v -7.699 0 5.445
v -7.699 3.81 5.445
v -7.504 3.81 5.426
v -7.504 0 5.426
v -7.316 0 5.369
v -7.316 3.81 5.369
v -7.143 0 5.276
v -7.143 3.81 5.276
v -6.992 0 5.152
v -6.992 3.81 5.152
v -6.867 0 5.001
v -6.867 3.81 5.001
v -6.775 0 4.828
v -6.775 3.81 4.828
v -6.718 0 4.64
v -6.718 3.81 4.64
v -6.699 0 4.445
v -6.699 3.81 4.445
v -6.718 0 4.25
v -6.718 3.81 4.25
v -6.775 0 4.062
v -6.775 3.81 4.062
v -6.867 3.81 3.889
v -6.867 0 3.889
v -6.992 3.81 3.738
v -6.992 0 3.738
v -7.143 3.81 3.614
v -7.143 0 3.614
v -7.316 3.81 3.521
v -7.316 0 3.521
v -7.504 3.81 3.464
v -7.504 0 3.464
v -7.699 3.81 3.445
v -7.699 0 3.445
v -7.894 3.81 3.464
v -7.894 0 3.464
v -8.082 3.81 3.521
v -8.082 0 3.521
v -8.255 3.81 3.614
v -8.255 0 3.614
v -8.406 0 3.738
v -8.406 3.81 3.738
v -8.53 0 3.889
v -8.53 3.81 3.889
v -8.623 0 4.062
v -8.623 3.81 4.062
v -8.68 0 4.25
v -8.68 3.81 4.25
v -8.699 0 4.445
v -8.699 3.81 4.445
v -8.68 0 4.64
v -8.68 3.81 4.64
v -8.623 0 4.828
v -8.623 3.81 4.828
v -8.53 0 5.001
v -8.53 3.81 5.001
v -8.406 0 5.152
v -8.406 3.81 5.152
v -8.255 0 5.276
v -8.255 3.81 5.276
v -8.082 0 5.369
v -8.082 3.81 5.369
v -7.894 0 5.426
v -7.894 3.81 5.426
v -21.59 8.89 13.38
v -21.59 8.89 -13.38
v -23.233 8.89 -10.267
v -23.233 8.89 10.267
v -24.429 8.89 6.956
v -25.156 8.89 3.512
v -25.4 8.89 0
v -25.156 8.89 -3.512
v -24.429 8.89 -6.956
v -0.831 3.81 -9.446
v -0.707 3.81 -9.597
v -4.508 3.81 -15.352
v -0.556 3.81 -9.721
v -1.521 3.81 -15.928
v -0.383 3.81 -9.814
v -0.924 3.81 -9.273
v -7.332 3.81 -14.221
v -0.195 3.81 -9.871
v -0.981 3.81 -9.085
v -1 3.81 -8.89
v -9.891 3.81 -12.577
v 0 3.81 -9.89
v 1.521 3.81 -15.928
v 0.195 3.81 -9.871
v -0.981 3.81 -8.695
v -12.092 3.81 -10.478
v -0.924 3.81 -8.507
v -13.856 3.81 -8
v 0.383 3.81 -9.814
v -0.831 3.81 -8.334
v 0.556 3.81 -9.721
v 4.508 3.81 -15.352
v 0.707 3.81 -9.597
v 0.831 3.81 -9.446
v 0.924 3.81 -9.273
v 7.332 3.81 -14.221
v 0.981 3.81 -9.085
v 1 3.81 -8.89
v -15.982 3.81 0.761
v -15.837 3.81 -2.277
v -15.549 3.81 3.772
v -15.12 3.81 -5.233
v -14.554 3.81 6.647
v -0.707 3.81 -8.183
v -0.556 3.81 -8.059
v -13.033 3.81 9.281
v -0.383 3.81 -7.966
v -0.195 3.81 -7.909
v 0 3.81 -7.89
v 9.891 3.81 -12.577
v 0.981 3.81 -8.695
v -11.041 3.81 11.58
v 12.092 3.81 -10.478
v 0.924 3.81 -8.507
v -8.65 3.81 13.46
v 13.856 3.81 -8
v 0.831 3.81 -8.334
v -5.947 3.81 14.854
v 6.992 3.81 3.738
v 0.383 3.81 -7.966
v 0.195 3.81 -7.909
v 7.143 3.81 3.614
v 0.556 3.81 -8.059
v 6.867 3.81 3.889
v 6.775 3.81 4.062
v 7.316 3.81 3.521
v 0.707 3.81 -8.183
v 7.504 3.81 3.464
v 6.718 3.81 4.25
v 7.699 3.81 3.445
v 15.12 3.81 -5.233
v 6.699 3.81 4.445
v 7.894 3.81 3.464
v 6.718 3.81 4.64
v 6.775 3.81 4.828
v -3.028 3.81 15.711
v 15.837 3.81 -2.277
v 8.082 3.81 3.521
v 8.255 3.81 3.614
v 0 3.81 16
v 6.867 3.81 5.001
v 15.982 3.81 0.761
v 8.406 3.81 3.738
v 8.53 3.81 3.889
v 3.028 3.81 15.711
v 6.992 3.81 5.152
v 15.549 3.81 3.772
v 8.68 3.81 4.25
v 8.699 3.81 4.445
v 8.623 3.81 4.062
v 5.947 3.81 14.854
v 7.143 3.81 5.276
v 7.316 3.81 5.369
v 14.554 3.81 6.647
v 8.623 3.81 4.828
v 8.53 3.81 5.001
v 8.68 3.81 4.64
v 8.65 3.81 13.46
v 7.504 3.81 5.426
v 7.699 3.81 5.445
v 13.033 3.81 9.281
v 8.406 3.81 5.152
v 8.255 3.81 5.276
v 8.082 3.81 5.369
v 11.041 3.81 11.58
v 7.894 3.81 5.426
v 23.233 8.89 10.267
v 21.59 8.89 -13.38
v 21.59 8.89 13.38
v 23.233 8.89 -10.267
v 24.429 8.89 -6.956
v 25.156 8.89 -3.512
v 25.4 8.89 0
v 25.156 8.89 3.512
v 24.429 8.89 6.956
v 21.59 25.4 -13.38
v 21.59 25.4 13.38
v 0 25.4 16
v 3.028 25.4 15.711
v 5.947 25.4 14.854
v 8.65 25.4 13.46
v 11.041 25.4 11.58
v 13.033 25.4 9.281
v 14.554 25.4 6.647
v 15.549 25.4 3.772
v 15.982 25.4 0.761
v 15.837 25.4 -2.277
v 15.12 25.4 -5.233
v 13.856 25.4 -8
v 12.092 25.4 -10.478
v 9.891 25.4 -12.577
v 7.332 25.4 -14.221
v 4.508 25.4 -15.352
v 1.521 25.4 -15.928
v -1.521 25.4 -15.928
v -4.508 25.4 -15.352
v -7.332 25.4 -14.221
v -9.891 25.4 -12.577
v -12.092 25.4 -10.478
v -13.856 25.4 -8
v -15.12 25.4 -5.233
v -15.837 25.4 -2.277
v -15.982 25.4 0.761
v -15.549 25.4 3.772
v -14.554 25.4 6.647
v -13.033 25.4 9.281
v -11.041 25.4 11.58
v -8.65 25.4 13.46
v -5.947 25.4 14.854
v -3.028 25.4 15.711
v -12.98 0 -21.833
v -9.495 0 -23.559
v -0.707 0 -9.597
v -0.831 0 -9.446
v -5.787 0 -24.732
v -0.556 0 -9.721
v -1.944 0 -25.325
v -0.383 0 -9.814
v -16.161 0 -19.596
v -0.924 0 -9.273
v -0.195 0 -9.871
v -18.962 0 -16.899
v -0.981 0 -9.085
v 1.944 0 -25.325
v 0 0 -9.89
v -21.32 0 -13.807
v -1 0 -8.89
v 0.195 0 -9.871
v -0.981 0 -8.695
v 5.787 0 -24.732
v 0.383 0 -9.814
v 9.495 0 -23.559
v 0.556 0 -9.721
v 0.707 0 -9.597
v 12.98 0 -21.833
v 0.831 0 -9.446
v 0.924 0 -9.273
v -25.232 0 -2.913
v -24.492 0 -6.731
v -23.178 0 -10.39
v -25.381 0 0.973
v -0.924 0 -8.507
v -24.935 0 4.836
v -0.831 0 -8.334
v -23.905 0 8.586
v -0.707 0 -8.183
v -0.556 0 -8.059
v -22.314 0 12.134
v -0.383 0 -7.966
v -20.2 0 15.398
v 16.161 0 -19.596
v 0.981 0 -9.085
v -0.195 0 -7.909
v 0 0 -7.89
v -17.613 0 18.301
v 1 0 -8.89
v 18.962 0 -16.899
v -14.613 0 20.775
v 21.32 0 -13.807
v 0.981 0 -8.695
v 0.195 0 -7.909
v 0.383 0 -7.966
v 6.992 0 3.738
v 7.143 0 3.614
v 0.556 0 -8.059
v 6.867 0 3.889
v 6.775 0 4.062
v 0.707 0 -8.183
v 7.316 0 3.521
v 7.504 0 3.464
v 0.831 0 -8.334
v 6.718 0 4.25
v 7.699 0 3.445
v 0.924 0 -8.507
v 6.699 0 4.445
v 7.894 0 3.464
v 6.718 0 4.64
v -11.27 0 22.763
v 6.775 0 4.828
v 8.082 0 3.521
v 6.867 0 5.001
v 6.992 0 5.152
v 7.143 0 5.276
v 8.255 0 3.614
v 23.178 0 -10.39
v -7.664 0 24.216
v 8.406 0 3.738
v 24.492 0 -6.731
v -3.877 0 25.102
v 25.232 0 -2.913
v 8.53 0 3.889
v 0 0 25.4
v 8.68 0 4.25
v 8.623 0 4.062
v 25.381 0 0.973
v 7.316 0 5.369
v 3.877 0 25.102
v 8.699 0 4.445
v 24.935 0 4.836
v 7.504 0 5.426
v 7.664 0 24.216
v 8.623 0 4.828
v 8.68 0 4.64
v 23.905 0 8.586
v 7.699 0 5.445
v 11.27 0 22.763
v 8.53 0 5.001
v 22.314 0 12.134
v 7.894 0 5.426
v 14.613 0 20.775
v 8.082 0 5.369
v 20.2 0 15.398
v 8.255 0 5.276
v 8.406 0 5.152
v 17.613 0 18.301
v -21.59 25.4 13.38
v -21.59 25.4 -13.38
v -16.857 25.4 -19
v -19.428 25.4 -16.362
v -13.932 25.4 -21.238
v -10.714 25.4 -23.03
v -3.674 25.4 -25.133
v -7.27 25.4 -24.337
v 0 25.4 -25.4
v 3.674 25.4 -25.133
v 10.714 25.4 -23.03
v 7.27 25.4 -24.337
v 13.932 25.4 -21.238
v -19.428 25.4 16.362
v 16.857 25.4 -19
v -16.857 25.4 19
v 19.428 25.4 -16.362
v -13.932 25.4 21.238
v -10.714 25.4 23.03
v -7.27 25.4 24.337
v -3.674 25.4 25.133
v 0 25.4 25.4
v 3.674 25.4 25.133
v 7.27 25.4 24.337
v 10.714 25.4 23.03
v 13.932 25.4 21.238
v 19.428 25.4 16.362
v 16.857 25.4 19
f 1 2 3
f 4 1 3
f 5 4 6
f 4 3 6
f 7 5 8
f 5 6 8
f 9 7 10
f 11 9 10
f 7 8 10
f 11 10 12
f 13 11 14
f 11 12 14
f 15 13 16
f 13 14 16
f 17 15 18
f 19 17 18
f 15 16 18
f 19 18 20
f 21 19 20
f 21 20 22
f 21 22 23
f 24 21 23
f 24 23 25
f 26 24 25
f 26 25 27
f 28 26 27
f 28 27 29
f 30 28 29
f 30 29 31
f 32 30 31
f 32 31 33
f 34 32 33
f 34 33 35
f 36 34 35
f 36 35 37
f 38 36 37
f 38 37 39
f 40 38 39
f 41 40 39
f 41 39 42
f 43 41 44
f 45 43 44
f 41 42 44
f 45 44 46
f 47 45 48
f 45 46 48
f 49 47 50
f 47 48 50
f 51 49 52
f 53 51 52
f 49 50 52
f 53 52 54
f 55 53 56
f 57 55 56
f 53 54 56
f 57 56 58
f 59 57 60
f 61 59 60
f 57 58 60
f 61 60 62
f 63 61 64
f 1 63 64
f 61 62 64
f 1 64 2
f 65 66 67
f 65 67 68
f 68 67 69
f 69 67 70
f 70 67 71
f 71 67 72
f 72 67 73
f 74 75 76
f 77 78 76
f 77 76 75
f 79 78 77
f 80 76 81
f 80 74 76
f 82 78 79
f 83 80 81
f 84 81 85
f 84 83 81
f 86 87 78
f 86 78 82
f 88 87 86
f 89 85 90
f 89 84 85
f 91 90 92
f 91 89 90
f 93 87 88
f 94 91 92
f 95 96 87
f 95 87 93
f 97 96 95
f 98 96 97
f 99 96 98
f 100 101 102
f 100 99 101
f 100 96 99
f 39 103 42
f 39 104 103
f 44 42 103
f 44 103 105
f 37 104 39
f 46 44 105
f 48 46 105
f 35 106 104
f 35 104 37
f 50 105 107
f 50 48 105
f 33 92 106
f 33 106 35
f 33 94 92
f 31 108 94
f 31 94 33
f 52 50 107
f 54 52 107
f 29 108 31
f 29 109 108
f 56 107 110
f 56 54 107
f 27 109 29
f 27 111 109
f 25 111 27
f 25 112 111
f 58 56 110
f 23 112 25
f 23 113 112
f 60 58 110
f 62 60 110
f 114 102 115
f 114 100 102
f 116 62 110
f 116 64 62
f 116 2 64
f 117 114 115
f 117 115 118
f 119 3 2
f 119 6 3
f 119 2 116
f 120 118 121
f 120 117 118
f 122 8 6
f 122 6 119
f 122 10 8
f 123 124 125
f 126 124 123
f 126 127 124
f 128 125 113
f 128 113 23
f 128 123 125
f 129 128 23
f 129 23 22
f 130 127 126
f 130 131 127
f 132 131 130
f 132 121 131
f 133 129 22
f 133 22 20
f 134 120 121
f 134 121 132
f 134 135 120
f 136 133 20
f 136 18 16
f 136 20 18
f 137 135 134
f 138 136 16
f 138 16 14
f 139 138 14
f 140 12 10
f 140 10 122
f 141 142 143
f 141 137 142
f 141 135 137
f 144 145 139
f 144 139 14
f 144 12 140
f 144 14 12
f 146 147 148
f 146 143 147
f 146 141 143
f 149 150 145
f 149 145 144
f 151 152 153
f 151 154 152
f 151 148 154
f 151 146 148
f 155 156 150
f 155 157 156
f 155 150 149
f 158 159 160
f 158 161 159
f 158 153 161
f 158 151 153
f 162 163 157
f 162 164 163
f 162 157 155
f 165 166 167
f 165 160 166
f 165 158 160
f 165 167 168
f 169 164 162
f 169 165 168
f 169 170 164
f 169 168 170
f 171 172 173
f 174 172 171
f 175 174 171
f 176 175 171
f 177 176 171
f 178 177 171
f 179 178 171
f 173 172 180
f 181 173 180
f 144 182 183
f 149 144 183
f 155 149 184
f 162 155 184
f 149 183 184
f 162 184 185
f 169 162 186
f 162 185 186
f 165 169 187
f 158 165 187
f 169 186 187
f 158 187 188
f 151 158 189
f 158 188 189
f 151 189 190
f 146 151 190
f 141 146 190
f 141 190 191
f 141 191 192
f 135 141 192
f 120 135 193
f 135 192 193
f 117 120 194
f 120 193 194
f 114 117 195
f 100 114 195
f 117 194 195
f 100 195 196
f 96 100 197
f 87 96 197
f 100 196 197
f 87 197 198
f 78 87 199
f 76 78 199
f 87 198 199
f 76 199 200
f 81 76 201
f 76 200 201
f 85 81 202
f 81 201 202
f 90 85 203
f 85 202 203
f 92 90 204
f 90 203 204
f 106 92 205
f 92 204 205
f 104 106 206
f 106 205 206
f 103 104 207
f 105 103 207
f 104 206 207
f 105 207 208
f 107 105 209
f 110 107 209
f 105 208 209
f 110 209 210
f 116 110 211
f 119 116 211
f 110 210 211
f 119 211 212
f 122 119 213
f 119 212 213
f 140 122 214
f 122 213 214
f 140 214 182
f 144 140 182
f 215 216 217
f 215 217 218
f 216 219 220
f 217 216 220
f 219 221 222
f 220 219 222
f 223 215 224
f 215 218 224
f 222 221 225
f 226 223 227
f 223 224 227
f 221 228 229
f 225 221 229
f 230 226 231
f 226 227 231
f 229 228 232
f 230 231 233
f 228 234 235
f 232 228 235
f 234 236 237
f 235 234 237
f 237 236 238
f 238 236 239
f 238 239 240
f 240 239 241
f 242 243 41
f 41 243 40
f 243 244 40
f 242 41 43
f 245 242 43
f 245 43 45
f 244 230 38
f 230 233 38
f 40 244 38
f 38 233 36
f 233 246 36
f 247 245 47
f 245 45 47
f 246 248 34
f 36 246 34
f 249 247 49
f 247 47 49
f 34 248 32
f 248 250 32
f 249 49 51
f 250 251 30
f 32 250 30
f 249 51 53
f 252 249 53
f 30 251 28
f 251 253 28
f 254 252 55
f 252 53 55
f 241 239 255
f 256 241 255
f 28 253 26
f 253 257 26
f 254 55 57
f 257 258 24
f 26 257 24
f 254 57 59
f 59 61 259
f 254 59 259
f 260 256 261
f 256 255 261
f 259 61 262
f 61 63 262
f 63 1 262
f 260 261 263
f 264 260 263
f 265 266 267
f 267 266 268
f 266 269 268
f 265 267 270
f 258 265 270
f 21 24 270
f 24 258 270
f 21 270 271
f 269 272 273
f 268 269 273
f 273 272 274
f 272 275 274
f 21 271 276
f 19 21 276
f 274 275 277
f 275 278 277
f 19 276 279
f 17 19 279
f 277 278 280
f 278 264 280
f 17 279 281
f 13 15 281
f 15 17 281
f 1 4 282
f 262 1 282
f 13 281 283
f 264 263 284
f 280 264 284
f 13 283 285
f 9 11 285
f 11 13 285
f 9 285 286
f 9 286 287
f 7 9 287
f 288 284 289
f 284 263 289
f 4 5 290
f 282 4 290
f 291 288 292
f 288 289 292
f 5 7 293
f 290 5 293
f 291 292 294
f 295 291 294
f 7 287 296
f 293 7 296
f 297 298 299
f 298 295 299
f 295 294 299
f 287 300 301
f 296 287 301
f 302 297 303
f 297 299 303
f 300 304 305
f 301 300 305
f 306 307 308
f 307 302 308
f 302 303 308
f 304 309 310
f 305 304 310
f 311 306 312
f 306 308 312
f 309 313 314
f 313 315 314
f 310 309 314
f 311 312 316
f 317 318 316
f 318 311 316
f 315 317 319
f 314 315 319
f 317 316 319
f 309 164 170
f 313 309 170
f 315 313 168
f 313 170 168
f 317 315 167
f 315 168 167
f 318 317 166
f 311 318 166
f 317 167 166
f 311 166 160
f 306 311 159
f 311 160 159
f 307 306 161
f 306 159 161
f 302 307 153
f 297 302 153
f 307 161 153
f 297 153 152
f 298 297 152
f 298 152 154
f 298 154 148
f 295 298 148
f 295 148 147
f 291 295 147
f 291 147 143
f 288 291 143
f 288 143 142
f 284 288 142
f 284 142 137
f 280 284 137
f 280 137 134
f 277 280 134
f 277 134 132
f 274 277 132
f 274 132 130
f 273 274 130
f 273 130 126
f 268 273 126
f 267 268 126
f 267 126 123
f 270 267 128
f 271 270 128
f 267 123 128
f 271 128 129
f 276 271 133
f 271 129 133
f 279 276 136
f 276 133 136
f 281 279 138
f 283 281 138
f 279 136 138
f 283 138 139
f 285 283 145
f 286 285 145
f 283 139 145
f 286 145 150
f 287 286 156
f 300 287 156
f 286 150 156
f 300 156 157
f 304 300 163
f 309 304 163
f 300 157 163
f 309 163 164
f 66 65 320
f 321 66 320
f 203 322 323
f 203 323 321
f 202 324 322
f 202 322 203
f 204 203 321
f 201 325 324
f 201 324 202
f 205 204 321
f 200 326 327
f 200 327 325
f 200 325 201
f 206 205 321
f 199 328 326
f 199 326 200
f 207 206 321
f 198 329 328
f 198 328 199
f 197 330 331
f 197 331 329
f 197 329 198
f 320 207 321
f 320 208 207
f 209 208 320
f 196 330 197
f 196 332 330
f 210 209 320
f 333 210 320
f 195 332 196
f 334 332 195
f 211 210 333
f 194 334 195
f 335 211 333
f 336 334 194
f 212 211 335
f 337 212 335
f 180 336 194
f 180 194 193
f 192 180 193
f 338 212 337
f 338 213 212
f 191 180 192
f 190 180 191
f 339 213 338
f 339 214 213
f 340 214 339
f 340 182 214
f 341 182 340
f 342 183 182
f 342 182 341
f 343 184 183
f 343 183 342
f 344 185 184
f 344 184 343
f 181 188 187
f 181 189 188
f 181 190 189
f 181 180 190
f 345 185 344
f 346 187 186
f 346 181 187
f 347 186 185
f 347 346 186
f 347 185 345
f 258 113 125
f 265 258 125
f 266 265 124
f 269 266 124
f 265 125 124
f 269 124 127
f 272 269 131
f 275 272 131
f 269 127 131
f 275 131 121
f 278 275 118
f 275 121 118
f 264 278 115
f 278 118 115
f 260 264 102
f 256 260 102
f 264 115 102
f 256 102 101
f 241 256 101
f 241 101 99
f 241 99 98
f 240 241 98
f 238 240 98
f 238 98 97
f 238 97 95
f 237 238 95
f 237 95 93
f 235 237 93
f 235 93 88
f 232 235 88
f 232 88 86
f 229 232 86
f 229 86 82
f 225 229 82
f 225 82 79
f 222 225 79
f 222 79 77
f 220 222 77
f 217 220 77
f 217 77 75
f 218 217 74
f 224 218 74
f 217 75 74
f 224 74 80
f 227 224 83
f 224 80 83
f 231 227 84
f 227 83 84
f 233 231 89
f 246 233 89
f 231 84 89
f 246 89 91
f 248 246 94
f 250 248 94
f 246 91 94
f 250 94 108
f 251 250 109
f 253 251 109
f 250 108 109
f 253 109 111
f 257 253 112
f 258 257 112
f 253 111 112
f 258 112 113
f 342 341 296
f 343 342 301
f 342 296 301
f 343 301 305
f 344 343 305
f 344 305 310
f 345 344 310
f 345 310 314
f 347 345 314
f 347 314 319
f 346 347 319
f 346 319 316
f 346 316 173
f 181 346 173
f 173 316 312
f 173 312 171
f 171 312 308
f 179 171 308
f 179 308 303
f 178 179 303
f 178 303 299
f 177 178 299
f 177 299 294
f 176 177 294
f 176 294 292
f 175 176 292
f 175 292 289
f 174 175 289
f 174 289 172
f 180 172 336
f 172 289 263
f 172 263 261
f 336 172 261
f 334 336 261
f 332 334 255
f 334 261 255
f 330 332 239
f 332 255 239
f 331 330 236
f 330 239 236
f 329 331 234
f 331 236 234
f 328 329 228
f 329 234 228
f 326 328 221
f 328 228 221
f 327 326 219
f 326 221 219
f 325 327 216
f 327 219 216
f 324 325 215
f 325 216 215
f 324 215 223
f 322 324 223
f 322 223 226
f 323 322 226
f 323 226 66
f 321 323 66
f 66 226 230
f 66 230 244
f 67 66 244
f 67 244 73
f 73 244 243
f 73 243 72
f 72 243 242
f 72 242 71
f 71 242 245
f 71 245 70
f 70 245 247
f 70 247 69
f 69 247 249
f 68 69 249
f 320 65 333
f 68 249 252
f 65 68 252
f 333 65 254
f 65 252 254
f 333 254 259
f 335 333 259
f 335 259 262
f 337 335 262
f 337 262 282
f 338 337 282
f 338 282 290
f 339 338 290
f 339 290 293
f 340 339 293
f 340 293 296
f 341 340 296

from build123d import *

# Parameters (mm, degrees)
SKETCH1_R                           = 25.4
BOSS_EXTRUDE1_DEPTH                 = 25.4
SKETCH2_R                           = 16
CUT_EXTRUDE1_DEPTH                  = 21.59
CUT_EXTRUDE2_REACH                  = 45.994
CUT_EXTRUDE2_END_RADIUS             = 25.4
SKETCH3_W                           = 3.81
SKETCH3_H                           = 16.51
CUT_EXTRUDE2_DIRECTION_2_REACH      = 45.994
CUT_EXTRUDE2_DIRECTION_2_END_RADIUS = 25.4
CUT_EXTRUDE3_REACH                  = 43.91
SKETCH4_R                           = 1


with BuildPart() as part:
    # Sketch1 → Boss-Extrude1 (new body)
    with BuildSketch(Plane(origin=(0, 0, 0), x_dir=(1, 0, 0), z_dir=(0, 1, 0))):
        with Locations(Location((0, 0, 0), (0, 0, 270))):
            Circle(SKETCH1_R)
    extrude(amount=BOSS_EXTRUDE1_DEPTH)

    # Sketch2 → Cut-Extrude1 (cut)
    with BuildSketch(Plane(origin=(0, 25.4, 0), x_dir=(1, 0, 0), z_dir=(0, 1, 0))):
        with Locations(Location((0, 0, 0), (0, 0, 270))):
            Circle(SKETCH2_R)
    extrude(amount=-CUT_EXTRUDE1_DEPTH, mode=Mode.SUBTRACT)

    # Cut-Extrude2: up to this cylinder (the profile starts inside it)
    cut_extrude2_end = Plane(origin=(0, 17.145, 0), z_dir=(0, -1, 0)) * Cylinder(CUT_EXTRUDE2_END_RADIUS, 143.788, mode=Mode.PRIVATE)
    # Sketch3 → Cut-Extrude2 (cut, up to the surface)
    with BuildSketch(Plane.XY, mode=Mode.PRIVATE) as cut_extrude2_sk1:
        with Locations((23.495, 17.145)):
            Rectangle(SKETCH3_W, SKETCH3_H)
    cut_extrude2_tool1 = extrude(cut_extrude2_sk1.sketch, amount=-CUT_EXTRUDE2_REACH, mode=Mode.PRIVATE) & cut_extrude2_end
    add(cut_extrude2_tool1.solids().sort_by_distance((23.495, 17.145, 0))[0], mode=Mode.SUBTRACT)
    # Sketch3 → Cut-Extrude2 (cut, up to the surface)
    with BuildSketch(Plane.XY, mode=Mode.PRIVATE) as cut_extrude2_sk2:
        with Locations((-23.495, 17.145)):
            Rectangle(SKETCH3_W, SKETCH3_H)
    cut_extrude2_tool2 = extrude(cut_extrude2_sk2.sketch, amount=-CUT_EXTRUDE2_REACH, mode=Mode.PRIVATE) & cut_extrude2_end
    add(cut_extrude2_tool2.solids().sort_by_distance((-23.495, 17.145, 0))[0], mode=Mode.SUBTRACT)

    # Cut-Extrude2 direction 2: up to this cylinder (the profile starts inside it)
    cut_extrude2_direction_2_end = Plane(origin=(0, 17.145, 0), z_dir=(0, -1, 0)) * Cylinder(CUT_EXTRUDE2_DIRECTION_2_END_RADIUS, 143.788, mode=Mode.PRIVATE)
    # Sketch3 → Cut-Extrude2 direction 2 (cut, up to the surface)
    with BuildSketch(Plane.XY, mode=Mode.PRIVATE) as cut_extrude2_direction_2_sk1:
        with Locations((23.495, 17.145)):
            Rectangle(SKETCH3_W, SKETCH3_H)
    cut_extrude2_direction_2_tool1 = extrude(cut_extrude2_direction_2_sk1.sketch, amount=CUT_EXTRUDE2_DIRECTION_2_REACH, mode=Mode.PRIVATE) & cut_extrude2_direction_2_end
    add(cut_extrude2_direction_2_tool1.solids().sort_by_distance((23.495, 17.145, 0))[0], mode=Mode.SUBTRACT)
    # Sketch3 → Cut-Extrude2 direction 2 (cut, up to the surface)
    with BuildSketch(Plane.XY, mode=Mode.PRIVATE) as cut_extrude2_direction_2_sk2:
        with Locations((-23.495, 17.145)):
            Rectangle(SKETCH3_W, SKETCH3_H)
    cut_extrude2_direction_2_tool2 = extrude(cut_extrude2_direction_2_sk2.sketch, amount=CUT_EXTRUDE2_DIRECTION_2_REACH, mode=Mode.PRIVATE) & cut_extrude2_direction_2_end
    add(cut_extrude2_direction_2_tool2.solids().sort_by_distance((-23.495, 17.145, 0))[0], mode=Mode.SUBTRACT)

    # Sketch4 → Cut-Extrude3 (cut, up to next)
    with BuildSketch(Plane(origin=(0, 3.81, 0), x_dir=(1, 0, 0), z_dir=(0, 1, 0)), mode=Mode.PRIVATE) as cut_extrude3_sk1:
        with Locations(Location((0, 8.89, 0), (0, 0, 270))):
            Circle(SKETCH4_R)
    cut_extrude3_tool1 = extrude(cut_extrude3_sk1.sketch, amount=-CUT_EXTRUDE3_REACH, mode=Mode.PRIVATE) & part.part
    # Sketch4 → Cut-Extrude3 (cut, up to next)
    with BuildSketch(Plane(origin=(0, 3.81, 0), x_dir=(1, 0, 0), z_dir=(0, 1, 0)), mode=Mode.PRIVATE) as cut_extrude3_sk2:
        with Locations(Location((7.69896584, -4.445, 0), (0, 0, 270))):
            Circle(SKETCH4_R)
    cut_extrude3_tool2 = extrude(cut_extrude3_sk2.sketch, amount=-CUT_EXTRUDE3_REACH, mode=Mode.PRIVATE) & part.part
    # Sketch4 → Cut-Extrude3 (cut, up to next)
    with BuildSketch(Plane(origin=(0, 3.81, 0), x_dir=(1, 0, 0), z_dir=(0, 1, 0)), mode=Mode.PRIVATE) as cut_extrude3_sk3:
        with Locations(Location((-7.69896584, -4.445, 0), (0, 0, 270))):
            Circle(SKETCH4_R)
    cut_extrude3_tool3 = extrude(cut_extrude3_sk3.sketch, amount=-CUT_EXTRUDE3_REACH, mode=Mode.PRIVATE) & part.part
    add(cut_extrude3_tool1.solids().sort_by_distance((0, 3.81, -8.89))[0], mode=Mode.SUBTRACT)
    add(cut_extrude3_tool2.solids().sort_by_distance((7.698966, 3.81, 4.445))[0], mode=Mode.SUBTRACT)
    add(cut_extrude3_tool3.solids().sort_by_distance((-7.698966, 3.81, 4.445))[0], mode=Mode.SUBTRACT)


solid = part.part
